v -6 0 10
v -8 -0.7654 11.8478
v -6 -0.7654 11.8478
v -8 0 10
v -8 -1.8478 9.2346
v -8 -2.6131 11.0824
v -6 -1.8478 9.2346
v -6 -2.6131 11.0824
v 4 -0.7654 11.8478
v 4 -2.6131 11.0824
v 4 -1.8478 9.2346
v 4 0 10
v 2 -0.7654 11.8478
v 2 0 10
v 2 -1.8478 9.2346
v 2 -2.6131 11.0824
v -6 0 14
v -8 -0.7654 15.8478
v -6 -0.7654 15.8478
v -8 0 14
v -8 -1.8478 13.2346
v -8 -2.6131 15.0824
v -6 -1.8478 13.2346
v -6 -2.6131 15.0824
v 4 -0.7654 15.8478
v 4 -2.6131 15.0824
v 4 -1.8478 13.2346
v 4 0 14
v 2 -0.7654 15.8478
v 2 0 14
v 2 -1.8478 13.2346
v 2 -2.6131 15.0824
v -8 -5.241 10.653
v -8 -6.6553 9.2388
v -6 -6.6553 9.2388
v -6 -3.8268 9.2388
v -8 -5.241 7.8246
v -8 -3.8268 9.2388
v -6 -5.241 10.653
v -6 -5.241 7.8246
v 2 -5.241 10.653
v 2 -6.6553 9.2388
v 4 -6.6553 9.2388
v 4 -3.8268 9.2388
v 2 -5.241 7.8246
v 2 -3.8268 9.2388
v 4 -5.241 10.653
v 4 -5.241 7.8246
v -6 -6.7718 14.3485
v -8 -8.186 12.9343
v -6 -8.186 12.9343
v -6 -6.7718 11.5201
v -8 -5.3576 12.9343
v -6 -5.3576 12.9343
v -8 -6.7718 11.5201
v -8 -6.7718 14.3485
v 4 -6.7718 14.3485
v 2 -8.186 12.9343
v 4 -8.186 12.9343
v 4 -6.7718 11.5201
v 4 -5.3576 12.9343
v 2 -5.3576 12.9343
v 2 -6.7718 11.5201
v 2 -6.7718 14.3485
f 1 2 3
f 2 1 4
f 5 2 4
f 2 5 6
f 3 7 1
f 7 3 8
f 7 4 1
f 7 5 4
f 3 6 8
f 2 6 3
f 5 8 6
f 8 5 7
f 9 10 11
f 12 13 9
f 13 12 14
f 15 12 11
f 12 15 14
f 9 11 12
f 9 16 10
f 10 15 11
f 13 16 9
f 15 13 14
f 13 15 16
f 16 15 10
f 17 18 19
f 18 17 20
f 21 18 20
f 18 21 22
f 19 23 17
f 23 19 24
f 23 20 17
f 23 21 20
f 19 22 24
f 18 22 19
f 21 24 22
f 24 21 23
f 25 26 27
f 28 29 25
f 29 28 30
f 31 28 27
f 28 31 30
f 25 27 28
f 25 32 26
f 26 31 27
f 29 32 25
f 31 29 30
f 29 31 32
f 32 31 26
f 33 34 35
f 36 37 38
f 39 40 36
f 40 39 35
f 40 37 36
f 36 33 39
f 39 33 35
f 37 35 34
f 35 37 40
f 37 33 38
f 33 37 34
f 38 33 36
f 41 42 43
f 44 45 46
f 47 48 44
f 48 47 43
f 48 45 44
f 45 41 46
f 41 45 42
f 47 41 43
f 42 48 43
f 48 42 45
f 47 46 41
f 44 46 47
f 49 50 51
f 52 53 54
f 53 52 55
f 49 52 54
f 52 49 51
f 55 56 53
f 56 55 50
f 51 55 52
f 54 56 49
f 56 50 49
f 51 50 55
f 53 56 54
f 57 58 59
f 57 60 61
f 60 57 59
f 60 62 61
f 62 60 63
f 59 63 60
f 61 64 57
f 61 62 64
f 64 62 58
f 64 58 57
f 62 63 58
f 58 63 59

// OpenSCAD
$fn=7;
union()
{
	union()
	{
		translate([-7.999998,-2.6131258,11.08239])
		{
			rotate(92.18123,[0.19148047,0.96263725,0.19148047])
			{
				cube([2,2,2]);
			}
		}
		translate([2,-2.6131258,11.082392])
		{
			rotate(92.18123,[0.19148047,0.96263725,0.19148047])
			{
				cube([2,2,2]);
			}
		}
	}
	union()
	{
		translate([-7.999998,-2.6131258,15.08239])
		{
			rotate(92.18123,[0.19148047,0.96263725,0.19148047])
			{
				cube([2,2,2]);
			}
		}
		translate([2,-2.6131258,15.082392])
		{
			rotate(92.18123,[0.19148047,0.96263725,0.19148047])
			{
				cube([2,2,2]);
			}
		}
	}
	union()
	{
		translate([-7.9999976,-6.655261,9.238793])
		{
			rotate(98.42107,[0.35740674,0.8628562,0.35740682])
			{
				cube([2,2,2]);
			}
		}
		translate([2.0000002,-6.6552615,9.238795])
		{
			rotate(98.42107,[0.35740674,0.8628562,0.35740682])
			{
				cube([2,2,2]);
			}
		}
	}
	union()
	{
		translate([-7.9999976,-8.185995,12.934311])
		{
			rotate(98.42107,[0.35740674,0.8628562,0.35740682])
			{
				cube([2,2,2]);
			}
		}
		translate([2.0000002,-8.185995,12.934313])
		{
			rotate(98.42107,[0.35740674,0.8628562,0.35740682])
			{
				cube([2,2,2]);
			}
		}
	}
}
